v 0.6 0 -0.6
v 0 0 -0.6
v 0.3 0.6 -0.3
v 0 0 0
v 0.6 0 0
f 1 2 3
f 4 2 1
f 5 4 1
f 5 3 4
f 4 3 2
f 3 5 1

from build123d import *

# Parameters (mm, degrees)
SKETCH1_W           = 0.6
SKETCH1_H           = 0.6
BOSS_EXTRUDE1_DEPTH = 0.6
CUT_EXTRUDE1_DEPTH  = 0.6
CUT_EXTRUDE4_DEPTH  = 0.6


with BuildPart() as part:
    # Sketch1 → Boss-Extrude1 (new body)
    with BuildSketch(Plane(origin=(0, 0, 0), x_dir=(1, 0, 0), z_dir=(0, 1, 0))):
        with Locations((0.3, 0.3)):
            Rectangle(SKETCH1_W, SKETCH1_H)
    extrude(amount=BOSS_EXTRUDE1_DEPTH)

    # Sketch2 → Cut-Extrude1 (cut)
    with BuildSketch(Plane.XY):
        Polygon((0, 0.6), (0.3, 0.6), (0, 0), align=None)
        Polygon((0.3, 0.6), (0.6, 0.6), (0.6, 0), align=None)
    extrude(amount=-CUT_EXTRUDE1_DEPTH, mode=Mode.SUBTRACT)

    # Sketch3 → Cut-Extrude4 (cut)
    with BuildSketch(Plane(origin=(0, 0, 0), x_dir=(0, 0, -1), z_dir=(1, 0, 0))):
        Polygon((0.6, 0.6), (0.6, 0), (0.3, 0.6), align=None)
        Polygon((0, 0.6), (0.3, 0.6), (0, 0), align=None)
    extrude(amount=CUT_EXTRUDE4_DEPTH, mode=Mode.SUBTRACT)


solid = part.part
